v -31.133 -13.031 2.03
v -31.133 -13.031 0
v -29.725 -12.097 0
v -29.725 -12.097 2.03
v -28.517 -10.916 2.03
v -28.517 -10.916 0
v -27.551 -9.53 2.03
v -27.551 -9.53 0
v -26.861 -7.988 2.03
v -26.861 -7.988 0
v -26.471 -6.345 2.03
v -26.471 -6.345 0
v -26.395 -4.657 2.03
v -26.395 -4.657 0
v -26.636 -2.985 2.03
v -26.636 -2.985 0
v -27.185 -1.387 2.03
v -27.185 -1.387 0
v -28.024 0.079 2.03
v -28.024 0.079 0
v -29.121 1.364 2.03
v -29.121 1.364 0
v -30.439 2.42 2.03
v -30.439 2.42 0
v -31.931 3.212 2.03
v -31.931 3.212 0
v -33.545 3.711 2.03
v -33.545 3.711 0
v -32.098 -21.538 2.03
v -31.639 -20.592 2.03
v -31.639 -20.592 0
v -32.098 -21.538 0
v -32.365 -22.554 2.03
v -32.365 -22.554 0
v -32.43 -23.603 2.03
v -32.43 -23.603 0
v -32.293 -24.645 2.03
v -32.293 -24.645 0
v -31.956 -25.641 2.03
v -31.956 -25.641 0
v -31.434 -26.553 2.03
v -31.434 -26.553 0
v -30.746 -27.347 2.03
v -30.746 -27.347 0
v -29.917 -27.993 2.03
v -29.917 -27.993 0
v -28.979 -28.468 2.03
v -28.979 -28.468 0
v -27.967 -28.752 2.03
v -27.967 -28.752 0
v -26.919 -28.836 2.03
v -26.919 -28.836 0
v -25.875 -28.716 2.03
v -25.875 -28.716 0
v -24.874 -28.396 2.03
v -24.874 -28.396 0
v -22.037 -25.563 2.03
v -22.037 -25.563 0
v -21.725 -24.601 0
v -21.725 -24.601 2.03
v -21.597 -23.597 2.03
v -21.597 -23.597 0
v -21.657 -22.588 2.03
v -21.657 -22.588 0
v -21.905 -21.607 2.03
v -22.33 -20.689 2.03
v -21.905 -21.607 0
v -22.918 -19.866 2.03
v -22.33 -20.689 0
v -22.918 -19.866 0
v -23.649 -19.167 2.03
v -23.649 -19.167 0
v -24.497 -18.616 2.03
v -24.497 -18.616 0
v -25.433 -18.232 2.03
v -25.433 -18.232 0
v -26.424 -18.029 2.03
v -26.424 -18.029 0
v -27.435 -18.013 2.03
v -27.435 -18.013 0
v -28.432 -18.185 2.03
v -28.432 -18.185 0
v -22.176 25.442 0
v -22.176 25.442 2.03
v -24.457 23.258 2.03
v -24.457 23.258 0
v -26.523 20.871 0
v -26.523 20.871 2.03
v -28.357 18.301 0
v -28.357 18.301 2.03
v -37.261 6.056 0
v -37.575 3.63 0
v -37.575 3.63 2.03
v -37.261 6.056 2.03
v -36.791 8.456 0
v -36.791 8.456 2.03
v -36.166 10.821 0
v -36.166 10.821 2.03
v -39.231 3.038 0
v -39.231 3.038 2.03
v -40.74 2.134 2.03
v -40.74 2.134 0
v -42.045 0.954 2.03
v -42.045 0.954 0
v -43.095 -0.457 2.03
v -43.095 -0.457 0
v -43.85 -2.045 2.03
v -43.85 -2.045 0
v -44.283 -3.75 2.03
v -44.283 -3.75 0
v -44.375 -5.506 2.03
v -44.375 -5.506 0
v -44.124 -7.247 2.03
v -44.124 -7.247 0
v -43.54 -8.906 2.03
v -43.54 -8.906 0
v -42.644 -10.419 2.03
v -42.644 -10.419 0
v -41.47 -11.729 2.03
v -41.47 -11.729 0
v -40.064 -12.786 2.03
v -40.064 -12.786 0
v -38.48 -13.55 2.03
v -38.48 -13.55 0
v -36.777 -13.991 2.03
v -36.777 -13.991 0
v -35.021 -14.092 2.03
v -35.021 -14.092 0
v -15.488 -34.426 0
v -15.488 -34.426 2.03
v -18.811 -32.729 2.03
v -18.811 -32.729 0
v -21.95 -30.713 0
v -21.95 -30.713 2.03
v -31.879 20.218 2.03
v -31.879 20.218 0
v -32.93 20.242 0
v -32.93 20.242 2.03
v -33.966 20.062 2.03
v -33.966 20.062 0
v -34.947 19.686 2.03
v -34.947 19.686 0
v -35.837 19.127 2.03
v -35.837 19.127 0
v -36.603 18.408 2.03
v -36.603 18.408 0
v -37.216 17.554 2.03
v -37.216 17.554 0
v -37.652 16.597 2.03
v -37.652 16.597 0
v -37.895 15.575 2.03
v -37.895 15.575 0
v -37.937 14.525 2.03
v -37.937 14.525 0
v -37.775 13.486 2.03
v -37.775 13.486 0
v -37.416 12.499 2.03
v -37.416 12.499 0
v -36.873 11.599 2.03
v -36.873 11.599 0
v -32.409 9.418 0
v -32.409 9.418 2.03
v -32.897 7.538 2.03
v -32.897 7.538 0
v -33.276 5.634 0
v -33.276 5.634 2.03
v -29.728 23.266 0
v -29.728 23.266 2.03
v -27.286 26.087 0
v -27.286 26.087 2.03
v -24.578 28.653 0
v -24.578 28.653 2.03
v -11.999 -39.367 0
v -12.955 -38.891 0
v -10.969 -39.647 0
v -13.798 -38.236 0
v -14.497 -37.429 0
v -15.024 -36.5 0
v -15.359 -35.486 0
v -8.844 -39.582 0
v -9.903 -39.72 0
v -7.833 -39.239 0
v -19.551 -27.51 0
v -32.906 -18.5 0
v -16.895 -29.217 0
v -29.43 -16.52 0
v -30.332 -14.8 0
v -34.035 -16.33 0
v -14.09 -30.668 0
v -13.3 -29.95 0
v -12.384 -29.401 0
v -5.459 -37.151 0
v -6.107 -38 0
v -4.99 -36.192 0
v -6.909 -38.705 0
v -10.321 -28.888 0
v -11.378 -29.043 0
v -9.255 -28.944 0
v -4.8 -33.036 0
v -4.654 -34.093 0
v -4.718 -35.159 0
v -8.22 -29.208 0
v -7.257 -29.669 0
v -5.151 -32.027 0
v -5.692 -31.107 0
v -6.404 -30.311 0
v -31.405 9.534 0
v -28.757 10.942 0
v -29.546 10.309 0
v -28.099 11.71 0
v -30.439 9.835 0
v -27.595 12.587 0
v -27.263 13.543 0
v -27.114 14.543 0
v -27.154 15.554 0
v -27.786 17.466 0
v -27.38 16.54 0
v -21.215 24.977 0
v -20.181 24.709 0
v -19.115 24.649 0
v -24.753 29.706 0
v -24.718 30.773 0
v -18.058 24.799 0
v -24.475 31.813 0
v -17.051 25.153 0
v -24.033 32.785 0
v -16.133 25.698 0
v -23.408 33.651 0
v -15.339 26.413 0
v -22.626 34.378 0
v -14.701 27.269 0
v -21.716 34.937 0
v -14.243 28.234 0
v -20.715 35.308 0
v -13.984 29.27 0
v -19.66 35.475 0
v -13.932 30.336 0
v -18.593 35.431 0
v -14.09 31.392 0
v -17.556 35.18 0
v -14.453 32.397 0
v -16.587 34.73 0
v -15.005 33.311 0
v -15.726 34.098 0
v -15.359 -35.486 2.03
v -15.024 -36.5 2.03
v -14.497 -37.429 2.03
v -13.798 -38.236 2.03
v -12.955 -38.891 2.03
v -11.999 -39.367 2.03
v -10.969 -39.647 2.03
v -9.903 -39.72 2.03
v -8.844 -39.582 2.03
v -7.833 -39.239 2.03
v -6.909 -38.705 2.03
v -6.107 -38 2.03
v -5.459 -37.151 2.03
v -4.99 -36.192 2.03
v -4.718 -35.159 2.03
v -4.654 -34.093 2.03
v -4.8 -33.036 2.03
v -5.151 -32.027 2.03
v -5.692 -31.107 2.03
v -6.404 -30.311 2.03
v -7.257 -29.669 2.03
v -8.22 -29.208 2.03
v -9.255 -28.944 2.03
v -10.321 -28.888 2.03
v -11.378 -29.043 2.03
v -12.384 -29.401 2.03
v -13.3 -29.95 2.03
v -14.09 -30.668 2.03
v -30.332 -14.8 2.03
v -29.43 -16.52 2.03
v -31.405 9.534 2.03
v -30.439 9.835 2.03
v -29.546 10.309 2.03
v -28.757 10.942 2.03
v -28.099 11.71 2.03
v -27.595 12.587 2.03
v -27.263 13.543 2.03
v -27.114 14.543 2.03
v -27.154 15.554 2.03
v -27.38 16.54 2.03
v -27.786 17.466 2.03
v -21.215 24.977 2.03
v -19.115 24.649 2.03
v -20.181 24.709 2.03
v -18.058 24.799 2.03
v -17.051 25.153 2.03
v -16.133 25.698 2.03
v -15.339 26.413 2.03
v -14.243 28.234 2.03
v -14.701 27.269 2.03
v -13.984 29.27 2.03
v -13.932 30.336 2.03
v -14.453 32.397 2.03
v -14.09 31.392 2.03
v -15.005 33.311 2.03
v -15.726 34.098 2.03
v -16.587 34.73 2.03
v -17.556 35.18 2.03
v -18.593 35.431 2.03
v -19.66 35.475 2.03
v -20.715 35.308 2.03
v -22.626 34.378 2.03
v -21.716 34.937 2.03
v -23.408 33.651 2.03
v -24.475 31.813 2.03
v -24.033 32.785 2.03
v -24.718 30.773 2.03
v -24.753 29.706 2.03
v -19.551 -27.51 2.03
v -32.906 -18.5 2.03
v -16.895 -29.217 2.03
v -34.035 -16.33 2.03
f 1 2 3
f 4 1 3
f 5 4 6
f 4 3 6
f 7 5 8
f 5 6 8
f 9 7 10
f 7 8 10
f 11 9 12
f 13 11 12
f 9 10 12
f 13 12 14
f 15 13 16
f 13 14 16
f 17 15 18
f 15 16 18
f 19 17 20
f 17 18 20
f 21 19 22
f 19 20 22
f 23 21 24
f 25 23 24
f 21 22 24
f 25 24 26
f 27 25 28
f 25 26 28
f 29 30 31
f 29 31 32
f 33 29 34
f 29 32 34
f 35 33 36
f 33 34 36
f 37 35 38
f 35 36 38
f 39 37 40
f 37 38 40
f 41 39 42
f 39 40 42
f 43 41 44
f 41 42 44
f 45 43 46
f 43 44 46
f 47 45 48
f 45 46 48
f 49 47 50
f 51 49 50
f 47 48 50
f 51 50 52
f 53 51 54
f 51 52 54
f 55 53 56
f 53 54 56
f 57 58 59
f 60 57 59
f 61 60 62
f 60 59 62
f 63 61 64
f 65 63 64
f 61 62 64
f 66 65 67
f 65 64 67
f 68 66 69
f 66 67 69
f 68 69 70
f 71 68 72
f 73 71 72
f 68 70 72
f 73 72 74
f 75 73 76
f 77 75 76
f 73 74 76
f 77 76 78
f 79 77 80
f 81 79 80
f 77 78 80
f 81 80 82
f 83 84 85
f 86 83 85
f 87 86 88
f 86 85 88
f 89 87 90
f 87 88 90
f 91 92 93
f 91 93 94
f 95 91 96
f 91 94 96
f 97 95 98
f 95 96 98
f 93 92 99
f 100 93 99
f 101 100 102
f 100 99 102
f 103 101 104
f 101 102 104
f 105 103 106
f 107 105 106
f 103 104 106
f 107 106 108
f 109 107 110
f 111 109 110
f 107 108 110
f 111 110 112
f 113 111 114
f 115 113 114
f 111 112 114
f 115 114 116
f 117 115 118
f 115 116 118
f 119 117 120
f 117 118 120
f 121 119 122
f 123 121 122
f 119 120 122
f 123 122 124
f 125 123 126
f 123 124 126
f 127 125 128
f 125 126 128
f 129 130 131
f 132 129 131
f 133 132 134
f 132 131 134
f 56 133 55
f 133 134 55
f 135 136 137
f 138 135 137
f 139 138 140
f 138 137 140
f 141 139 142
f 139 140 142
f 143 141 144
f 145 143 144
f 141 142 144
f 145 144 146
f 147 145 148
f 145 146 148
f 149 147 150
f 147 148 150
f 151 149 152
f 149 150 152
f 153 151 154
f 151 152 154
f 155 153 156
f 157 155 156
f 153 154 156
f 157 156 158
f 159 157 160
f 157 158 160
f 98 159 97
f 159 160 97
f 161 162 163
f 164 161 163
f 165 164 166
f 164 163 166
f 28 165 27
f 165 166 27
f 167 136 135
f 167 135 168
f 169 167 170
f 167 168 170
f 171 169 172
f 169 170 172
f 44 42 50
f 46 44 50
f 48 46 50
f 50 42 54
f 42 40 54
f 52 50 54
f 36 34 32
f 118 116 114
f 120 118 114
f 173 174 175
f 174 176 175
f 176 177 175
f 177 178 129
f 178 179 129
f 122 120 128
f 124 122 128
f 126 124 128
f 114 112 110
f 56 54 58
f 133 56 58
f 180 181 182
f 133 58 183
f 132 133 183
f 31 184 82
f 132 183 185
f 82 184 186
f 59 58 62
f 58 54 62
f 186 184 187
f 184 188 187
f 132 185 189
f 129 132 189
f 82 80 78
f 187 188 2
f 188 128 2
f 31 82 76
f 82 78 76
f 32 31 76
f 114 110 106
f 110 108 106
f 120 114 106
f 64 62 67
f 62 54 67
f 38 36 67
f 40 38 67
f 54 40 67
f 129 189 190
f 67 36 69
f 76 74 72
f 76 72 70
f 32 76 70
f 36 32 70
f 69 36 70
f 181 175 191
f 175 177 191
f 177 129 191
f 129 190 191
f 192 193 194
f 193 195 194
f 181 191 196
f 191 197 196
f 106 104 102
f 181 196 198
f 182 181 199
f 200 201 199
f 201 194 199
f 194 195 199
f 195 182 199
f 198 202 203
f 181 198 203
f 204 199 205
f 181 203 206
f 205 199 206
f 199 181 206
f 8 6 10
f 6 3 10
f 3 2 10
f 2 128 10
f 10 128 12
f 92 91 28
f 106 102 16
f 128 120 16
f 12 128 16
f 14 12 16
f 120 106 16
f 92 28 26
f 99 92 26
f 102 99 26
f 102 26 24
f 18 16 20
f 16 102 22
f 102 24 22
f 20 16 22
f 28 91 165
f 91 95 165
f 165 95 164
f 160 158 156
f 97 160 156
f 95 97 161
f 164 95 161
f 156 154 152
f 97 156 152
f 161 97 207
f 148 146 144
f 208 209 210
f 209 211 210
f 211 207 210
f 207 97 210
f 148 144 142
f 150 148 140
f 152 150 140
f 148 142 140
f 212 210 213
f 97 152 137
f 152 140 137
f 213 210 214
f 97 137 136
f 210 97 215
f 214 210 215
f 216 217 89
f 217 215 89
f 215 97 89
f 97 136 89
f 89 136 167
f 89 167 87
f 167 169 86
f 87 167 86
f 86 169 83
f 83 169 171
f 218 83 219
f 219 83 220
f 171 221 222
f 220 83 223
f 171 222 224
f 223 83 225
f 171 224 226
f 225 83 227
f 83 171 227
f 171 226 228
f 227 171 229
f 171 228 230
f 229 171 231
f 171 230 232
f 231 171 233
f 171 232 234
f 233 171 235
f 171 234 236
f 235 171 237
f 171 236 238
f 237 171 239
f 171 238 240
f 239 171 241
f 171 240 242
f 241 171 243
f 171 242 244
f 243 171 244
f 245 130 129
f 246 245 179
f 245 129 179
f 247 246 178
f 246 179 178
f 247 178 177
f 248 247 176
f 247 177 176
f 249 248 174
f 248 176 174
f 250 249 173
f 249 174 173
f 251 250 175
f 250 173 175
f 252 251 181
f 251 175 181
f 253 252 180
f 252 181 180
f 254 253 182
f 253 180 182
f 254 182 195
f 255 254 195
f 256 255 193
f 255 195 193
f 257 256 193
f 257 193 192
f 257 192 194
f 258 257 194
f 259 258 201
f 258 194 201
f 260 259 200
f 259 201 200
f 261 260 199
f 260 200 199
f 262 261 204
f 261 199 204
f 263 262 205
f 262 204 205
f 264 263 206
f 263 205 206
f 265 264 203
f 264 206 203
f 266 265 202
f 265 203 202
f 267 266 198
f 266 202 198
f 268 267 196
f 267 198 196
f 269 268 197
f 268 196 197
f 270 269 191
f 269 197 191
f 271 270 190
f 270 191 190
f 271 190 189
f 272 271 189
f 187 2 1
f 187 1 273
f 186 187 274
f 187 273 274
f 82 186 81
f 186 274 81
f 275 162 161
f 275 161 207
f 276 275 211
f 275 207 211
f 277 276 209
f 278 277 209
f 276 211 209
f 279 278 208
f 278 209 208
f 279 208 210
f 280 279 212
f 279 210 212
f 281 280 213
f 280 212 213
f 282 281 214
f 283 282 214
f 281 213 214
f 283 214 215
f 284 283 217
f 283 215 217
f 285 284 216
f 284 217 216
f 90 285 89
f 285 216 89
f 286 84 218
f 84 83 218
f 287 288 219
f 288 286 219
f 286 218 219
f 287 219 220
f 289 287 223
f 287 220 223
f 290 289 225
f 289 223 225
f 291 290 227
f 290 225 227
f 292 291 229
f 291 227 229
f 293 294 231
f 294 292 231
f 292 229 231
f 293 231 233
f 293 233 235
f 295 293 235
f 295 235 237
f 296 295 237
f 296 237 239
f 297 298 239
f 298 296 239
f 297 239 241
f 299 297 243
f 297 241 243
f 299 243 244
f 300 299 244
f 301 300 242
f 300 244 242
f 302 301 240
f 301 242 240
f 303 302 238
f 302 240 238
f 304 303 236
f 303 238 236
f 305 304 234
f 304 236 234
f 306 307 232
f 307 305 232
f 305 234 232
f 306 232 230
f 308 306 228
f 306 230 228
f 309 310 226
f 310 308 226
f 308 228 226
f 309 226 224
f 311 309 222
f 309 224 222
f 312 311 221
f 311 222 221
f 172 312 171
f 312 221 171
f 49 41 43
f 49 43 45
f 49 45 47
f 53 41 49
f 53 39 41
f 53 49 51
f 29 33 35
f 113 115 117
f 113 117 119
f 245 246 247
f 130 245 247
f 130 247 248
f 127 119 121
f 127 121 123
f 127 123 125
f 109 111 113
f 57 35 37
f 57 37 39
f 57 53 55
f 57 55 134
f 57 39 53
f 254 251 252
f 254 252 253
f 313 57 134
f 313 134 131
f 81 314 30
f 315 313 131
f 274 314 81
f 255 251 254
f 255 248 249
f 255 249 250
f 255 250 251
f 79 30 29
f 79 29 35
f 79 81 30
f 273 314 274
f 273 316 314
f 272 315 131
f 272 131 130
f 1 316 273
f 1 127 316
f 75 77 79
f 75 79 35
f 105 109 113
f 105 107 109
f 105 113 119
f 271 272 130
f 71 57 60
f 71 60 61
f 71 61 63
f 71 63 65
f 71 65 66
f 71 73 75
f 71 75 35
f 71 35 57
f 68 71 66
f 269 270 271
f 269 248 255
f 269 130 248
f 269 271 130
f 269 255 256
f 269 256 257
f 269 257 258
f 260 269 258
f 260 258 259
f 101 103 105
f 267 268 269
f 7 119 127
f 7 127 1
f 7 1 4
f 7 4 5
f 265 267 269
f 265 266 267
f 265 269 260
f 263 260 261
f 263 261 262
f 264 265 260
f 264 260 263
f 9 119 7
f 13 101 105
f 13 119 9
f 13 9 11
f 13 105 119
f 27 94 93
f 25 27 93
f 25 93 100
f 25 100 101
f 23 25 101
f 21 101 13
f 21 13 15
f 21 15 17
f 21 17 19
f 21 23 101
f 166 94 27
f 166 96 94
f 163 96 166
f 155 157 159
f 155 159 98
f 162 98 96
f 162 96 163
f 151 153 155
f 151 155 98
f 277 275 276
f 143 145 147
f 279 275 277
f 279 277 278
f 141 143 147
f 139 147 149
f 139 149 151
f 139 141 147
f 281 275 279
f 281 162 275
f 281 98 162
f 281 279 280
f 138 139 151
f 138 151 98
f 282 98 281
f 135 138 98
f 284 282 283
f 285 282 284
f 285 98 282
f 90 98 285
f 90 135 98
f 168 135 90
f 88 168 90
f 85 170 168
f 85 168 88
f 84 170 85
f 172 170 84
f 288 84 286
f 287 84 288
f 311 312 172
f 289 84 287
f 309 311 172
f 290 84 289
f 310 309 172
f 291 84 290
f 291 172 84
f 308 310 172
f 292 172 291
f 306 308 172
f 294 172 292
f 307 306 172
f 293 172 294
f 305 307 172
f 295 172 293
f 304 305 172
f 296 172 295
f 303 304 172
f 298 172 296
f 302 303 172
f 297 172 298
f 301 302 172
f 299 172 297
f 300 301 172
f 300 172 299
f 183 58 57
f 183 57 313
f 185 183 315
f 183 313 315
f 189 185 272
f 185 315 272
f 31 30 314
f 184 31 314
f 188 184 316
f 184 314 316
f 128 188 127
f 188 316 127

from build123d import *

# Parameters (mm, degrees)
PADS_SKETCH_R   = 5.42
PADS_DEPTH      = 2.03
PADS_2_DEPTH    = 2.03
PADS_3_DEPTH    = 2.03
PADS_4_DEPTH    = 2.03
PADS_SKETCH_R_2 = 9
PADS_5_DEPTH    = 2.03
CONNECTOR_DEPTH = 2.03


with BuildPart() as part:
    # Pads Sketch → Pads (new body)
    with BuildSketch(Plane.XY):
        with Locations((-10.069761866, -34.302512969)):
            Circle(PADS_SKETCH_R)
    extrude(amount=PADS_DEPTH)



with BuildPart() as body_2:
    # Pads Sketch → Pads 2 (new body)
    with BuildSketch(Plane.XY):
        with Locations((-27.013589298, -23.416415038)):
            Circle(PADS_SKETCH_R)
    extrude(amount=PADS_2_DEPTH)


with BuildPart() as body_3:
    # Pads Sketch → Pads 3 (new body)
    with BuildSketch(Plane.XY):
        with Locations((-32.525938452, 14.836638023)):
            Circle(PADS_SKETCH_R)
    extrude(amount=PADS_3_DEPTH)


with BuildPart() as body_4:
    # Pads Sketch → Pads 4 (new body)
    with BuildSketch(Plane.XY):
        with Locations((-19.345084764, 30.063768817)):
            Circle(PADS_SKETCH_R)
    extrude(amount=PADS_4_DEPTH)


with BuildPart() as body_5:
    # Pads Sketch → Pads 5 (new body)
    with BuildSketch(Plane.XY):
        with Locations((-35.384500255, -5.09898438)):
            Circle(PADS_SKETCH_R_2)
    extrude(amount=PADS_5_DEPTH)


with BuildPart() as part_1:
    add(part.part)

    add(body_2.part)  # Connector merges body 2

    add(body_3.part)  # Connector merges body 3

    add(body_4.part)  # Connector merges body 4

    add(body_5.part)  # Connector merges body 5
    # Connector Sketch → Connector (add)
    with BuildSketch(Plane.XY.offset(2.03)):
        with BuildLine():
            Line((-24.578173622, 28.652676688), (-22.176010765, 25.44183654))
            ThreePointArc((-22.176010765, 25.44183654), (-33.404947793, -4.813726513), (-14.090471833, -30.667916517))
            Line((-14.090471833, -30.667916517), (-15.488346946, -34.426350502))
            ThreePointArc((-15.488346946, -34.426350502), (-37.364052717, -5.384242247), (-24.578173622, 28.652676688))
        make_face()
    extrude(amount=-CONNECTOR_DEPTH)


solid = part_1.part
